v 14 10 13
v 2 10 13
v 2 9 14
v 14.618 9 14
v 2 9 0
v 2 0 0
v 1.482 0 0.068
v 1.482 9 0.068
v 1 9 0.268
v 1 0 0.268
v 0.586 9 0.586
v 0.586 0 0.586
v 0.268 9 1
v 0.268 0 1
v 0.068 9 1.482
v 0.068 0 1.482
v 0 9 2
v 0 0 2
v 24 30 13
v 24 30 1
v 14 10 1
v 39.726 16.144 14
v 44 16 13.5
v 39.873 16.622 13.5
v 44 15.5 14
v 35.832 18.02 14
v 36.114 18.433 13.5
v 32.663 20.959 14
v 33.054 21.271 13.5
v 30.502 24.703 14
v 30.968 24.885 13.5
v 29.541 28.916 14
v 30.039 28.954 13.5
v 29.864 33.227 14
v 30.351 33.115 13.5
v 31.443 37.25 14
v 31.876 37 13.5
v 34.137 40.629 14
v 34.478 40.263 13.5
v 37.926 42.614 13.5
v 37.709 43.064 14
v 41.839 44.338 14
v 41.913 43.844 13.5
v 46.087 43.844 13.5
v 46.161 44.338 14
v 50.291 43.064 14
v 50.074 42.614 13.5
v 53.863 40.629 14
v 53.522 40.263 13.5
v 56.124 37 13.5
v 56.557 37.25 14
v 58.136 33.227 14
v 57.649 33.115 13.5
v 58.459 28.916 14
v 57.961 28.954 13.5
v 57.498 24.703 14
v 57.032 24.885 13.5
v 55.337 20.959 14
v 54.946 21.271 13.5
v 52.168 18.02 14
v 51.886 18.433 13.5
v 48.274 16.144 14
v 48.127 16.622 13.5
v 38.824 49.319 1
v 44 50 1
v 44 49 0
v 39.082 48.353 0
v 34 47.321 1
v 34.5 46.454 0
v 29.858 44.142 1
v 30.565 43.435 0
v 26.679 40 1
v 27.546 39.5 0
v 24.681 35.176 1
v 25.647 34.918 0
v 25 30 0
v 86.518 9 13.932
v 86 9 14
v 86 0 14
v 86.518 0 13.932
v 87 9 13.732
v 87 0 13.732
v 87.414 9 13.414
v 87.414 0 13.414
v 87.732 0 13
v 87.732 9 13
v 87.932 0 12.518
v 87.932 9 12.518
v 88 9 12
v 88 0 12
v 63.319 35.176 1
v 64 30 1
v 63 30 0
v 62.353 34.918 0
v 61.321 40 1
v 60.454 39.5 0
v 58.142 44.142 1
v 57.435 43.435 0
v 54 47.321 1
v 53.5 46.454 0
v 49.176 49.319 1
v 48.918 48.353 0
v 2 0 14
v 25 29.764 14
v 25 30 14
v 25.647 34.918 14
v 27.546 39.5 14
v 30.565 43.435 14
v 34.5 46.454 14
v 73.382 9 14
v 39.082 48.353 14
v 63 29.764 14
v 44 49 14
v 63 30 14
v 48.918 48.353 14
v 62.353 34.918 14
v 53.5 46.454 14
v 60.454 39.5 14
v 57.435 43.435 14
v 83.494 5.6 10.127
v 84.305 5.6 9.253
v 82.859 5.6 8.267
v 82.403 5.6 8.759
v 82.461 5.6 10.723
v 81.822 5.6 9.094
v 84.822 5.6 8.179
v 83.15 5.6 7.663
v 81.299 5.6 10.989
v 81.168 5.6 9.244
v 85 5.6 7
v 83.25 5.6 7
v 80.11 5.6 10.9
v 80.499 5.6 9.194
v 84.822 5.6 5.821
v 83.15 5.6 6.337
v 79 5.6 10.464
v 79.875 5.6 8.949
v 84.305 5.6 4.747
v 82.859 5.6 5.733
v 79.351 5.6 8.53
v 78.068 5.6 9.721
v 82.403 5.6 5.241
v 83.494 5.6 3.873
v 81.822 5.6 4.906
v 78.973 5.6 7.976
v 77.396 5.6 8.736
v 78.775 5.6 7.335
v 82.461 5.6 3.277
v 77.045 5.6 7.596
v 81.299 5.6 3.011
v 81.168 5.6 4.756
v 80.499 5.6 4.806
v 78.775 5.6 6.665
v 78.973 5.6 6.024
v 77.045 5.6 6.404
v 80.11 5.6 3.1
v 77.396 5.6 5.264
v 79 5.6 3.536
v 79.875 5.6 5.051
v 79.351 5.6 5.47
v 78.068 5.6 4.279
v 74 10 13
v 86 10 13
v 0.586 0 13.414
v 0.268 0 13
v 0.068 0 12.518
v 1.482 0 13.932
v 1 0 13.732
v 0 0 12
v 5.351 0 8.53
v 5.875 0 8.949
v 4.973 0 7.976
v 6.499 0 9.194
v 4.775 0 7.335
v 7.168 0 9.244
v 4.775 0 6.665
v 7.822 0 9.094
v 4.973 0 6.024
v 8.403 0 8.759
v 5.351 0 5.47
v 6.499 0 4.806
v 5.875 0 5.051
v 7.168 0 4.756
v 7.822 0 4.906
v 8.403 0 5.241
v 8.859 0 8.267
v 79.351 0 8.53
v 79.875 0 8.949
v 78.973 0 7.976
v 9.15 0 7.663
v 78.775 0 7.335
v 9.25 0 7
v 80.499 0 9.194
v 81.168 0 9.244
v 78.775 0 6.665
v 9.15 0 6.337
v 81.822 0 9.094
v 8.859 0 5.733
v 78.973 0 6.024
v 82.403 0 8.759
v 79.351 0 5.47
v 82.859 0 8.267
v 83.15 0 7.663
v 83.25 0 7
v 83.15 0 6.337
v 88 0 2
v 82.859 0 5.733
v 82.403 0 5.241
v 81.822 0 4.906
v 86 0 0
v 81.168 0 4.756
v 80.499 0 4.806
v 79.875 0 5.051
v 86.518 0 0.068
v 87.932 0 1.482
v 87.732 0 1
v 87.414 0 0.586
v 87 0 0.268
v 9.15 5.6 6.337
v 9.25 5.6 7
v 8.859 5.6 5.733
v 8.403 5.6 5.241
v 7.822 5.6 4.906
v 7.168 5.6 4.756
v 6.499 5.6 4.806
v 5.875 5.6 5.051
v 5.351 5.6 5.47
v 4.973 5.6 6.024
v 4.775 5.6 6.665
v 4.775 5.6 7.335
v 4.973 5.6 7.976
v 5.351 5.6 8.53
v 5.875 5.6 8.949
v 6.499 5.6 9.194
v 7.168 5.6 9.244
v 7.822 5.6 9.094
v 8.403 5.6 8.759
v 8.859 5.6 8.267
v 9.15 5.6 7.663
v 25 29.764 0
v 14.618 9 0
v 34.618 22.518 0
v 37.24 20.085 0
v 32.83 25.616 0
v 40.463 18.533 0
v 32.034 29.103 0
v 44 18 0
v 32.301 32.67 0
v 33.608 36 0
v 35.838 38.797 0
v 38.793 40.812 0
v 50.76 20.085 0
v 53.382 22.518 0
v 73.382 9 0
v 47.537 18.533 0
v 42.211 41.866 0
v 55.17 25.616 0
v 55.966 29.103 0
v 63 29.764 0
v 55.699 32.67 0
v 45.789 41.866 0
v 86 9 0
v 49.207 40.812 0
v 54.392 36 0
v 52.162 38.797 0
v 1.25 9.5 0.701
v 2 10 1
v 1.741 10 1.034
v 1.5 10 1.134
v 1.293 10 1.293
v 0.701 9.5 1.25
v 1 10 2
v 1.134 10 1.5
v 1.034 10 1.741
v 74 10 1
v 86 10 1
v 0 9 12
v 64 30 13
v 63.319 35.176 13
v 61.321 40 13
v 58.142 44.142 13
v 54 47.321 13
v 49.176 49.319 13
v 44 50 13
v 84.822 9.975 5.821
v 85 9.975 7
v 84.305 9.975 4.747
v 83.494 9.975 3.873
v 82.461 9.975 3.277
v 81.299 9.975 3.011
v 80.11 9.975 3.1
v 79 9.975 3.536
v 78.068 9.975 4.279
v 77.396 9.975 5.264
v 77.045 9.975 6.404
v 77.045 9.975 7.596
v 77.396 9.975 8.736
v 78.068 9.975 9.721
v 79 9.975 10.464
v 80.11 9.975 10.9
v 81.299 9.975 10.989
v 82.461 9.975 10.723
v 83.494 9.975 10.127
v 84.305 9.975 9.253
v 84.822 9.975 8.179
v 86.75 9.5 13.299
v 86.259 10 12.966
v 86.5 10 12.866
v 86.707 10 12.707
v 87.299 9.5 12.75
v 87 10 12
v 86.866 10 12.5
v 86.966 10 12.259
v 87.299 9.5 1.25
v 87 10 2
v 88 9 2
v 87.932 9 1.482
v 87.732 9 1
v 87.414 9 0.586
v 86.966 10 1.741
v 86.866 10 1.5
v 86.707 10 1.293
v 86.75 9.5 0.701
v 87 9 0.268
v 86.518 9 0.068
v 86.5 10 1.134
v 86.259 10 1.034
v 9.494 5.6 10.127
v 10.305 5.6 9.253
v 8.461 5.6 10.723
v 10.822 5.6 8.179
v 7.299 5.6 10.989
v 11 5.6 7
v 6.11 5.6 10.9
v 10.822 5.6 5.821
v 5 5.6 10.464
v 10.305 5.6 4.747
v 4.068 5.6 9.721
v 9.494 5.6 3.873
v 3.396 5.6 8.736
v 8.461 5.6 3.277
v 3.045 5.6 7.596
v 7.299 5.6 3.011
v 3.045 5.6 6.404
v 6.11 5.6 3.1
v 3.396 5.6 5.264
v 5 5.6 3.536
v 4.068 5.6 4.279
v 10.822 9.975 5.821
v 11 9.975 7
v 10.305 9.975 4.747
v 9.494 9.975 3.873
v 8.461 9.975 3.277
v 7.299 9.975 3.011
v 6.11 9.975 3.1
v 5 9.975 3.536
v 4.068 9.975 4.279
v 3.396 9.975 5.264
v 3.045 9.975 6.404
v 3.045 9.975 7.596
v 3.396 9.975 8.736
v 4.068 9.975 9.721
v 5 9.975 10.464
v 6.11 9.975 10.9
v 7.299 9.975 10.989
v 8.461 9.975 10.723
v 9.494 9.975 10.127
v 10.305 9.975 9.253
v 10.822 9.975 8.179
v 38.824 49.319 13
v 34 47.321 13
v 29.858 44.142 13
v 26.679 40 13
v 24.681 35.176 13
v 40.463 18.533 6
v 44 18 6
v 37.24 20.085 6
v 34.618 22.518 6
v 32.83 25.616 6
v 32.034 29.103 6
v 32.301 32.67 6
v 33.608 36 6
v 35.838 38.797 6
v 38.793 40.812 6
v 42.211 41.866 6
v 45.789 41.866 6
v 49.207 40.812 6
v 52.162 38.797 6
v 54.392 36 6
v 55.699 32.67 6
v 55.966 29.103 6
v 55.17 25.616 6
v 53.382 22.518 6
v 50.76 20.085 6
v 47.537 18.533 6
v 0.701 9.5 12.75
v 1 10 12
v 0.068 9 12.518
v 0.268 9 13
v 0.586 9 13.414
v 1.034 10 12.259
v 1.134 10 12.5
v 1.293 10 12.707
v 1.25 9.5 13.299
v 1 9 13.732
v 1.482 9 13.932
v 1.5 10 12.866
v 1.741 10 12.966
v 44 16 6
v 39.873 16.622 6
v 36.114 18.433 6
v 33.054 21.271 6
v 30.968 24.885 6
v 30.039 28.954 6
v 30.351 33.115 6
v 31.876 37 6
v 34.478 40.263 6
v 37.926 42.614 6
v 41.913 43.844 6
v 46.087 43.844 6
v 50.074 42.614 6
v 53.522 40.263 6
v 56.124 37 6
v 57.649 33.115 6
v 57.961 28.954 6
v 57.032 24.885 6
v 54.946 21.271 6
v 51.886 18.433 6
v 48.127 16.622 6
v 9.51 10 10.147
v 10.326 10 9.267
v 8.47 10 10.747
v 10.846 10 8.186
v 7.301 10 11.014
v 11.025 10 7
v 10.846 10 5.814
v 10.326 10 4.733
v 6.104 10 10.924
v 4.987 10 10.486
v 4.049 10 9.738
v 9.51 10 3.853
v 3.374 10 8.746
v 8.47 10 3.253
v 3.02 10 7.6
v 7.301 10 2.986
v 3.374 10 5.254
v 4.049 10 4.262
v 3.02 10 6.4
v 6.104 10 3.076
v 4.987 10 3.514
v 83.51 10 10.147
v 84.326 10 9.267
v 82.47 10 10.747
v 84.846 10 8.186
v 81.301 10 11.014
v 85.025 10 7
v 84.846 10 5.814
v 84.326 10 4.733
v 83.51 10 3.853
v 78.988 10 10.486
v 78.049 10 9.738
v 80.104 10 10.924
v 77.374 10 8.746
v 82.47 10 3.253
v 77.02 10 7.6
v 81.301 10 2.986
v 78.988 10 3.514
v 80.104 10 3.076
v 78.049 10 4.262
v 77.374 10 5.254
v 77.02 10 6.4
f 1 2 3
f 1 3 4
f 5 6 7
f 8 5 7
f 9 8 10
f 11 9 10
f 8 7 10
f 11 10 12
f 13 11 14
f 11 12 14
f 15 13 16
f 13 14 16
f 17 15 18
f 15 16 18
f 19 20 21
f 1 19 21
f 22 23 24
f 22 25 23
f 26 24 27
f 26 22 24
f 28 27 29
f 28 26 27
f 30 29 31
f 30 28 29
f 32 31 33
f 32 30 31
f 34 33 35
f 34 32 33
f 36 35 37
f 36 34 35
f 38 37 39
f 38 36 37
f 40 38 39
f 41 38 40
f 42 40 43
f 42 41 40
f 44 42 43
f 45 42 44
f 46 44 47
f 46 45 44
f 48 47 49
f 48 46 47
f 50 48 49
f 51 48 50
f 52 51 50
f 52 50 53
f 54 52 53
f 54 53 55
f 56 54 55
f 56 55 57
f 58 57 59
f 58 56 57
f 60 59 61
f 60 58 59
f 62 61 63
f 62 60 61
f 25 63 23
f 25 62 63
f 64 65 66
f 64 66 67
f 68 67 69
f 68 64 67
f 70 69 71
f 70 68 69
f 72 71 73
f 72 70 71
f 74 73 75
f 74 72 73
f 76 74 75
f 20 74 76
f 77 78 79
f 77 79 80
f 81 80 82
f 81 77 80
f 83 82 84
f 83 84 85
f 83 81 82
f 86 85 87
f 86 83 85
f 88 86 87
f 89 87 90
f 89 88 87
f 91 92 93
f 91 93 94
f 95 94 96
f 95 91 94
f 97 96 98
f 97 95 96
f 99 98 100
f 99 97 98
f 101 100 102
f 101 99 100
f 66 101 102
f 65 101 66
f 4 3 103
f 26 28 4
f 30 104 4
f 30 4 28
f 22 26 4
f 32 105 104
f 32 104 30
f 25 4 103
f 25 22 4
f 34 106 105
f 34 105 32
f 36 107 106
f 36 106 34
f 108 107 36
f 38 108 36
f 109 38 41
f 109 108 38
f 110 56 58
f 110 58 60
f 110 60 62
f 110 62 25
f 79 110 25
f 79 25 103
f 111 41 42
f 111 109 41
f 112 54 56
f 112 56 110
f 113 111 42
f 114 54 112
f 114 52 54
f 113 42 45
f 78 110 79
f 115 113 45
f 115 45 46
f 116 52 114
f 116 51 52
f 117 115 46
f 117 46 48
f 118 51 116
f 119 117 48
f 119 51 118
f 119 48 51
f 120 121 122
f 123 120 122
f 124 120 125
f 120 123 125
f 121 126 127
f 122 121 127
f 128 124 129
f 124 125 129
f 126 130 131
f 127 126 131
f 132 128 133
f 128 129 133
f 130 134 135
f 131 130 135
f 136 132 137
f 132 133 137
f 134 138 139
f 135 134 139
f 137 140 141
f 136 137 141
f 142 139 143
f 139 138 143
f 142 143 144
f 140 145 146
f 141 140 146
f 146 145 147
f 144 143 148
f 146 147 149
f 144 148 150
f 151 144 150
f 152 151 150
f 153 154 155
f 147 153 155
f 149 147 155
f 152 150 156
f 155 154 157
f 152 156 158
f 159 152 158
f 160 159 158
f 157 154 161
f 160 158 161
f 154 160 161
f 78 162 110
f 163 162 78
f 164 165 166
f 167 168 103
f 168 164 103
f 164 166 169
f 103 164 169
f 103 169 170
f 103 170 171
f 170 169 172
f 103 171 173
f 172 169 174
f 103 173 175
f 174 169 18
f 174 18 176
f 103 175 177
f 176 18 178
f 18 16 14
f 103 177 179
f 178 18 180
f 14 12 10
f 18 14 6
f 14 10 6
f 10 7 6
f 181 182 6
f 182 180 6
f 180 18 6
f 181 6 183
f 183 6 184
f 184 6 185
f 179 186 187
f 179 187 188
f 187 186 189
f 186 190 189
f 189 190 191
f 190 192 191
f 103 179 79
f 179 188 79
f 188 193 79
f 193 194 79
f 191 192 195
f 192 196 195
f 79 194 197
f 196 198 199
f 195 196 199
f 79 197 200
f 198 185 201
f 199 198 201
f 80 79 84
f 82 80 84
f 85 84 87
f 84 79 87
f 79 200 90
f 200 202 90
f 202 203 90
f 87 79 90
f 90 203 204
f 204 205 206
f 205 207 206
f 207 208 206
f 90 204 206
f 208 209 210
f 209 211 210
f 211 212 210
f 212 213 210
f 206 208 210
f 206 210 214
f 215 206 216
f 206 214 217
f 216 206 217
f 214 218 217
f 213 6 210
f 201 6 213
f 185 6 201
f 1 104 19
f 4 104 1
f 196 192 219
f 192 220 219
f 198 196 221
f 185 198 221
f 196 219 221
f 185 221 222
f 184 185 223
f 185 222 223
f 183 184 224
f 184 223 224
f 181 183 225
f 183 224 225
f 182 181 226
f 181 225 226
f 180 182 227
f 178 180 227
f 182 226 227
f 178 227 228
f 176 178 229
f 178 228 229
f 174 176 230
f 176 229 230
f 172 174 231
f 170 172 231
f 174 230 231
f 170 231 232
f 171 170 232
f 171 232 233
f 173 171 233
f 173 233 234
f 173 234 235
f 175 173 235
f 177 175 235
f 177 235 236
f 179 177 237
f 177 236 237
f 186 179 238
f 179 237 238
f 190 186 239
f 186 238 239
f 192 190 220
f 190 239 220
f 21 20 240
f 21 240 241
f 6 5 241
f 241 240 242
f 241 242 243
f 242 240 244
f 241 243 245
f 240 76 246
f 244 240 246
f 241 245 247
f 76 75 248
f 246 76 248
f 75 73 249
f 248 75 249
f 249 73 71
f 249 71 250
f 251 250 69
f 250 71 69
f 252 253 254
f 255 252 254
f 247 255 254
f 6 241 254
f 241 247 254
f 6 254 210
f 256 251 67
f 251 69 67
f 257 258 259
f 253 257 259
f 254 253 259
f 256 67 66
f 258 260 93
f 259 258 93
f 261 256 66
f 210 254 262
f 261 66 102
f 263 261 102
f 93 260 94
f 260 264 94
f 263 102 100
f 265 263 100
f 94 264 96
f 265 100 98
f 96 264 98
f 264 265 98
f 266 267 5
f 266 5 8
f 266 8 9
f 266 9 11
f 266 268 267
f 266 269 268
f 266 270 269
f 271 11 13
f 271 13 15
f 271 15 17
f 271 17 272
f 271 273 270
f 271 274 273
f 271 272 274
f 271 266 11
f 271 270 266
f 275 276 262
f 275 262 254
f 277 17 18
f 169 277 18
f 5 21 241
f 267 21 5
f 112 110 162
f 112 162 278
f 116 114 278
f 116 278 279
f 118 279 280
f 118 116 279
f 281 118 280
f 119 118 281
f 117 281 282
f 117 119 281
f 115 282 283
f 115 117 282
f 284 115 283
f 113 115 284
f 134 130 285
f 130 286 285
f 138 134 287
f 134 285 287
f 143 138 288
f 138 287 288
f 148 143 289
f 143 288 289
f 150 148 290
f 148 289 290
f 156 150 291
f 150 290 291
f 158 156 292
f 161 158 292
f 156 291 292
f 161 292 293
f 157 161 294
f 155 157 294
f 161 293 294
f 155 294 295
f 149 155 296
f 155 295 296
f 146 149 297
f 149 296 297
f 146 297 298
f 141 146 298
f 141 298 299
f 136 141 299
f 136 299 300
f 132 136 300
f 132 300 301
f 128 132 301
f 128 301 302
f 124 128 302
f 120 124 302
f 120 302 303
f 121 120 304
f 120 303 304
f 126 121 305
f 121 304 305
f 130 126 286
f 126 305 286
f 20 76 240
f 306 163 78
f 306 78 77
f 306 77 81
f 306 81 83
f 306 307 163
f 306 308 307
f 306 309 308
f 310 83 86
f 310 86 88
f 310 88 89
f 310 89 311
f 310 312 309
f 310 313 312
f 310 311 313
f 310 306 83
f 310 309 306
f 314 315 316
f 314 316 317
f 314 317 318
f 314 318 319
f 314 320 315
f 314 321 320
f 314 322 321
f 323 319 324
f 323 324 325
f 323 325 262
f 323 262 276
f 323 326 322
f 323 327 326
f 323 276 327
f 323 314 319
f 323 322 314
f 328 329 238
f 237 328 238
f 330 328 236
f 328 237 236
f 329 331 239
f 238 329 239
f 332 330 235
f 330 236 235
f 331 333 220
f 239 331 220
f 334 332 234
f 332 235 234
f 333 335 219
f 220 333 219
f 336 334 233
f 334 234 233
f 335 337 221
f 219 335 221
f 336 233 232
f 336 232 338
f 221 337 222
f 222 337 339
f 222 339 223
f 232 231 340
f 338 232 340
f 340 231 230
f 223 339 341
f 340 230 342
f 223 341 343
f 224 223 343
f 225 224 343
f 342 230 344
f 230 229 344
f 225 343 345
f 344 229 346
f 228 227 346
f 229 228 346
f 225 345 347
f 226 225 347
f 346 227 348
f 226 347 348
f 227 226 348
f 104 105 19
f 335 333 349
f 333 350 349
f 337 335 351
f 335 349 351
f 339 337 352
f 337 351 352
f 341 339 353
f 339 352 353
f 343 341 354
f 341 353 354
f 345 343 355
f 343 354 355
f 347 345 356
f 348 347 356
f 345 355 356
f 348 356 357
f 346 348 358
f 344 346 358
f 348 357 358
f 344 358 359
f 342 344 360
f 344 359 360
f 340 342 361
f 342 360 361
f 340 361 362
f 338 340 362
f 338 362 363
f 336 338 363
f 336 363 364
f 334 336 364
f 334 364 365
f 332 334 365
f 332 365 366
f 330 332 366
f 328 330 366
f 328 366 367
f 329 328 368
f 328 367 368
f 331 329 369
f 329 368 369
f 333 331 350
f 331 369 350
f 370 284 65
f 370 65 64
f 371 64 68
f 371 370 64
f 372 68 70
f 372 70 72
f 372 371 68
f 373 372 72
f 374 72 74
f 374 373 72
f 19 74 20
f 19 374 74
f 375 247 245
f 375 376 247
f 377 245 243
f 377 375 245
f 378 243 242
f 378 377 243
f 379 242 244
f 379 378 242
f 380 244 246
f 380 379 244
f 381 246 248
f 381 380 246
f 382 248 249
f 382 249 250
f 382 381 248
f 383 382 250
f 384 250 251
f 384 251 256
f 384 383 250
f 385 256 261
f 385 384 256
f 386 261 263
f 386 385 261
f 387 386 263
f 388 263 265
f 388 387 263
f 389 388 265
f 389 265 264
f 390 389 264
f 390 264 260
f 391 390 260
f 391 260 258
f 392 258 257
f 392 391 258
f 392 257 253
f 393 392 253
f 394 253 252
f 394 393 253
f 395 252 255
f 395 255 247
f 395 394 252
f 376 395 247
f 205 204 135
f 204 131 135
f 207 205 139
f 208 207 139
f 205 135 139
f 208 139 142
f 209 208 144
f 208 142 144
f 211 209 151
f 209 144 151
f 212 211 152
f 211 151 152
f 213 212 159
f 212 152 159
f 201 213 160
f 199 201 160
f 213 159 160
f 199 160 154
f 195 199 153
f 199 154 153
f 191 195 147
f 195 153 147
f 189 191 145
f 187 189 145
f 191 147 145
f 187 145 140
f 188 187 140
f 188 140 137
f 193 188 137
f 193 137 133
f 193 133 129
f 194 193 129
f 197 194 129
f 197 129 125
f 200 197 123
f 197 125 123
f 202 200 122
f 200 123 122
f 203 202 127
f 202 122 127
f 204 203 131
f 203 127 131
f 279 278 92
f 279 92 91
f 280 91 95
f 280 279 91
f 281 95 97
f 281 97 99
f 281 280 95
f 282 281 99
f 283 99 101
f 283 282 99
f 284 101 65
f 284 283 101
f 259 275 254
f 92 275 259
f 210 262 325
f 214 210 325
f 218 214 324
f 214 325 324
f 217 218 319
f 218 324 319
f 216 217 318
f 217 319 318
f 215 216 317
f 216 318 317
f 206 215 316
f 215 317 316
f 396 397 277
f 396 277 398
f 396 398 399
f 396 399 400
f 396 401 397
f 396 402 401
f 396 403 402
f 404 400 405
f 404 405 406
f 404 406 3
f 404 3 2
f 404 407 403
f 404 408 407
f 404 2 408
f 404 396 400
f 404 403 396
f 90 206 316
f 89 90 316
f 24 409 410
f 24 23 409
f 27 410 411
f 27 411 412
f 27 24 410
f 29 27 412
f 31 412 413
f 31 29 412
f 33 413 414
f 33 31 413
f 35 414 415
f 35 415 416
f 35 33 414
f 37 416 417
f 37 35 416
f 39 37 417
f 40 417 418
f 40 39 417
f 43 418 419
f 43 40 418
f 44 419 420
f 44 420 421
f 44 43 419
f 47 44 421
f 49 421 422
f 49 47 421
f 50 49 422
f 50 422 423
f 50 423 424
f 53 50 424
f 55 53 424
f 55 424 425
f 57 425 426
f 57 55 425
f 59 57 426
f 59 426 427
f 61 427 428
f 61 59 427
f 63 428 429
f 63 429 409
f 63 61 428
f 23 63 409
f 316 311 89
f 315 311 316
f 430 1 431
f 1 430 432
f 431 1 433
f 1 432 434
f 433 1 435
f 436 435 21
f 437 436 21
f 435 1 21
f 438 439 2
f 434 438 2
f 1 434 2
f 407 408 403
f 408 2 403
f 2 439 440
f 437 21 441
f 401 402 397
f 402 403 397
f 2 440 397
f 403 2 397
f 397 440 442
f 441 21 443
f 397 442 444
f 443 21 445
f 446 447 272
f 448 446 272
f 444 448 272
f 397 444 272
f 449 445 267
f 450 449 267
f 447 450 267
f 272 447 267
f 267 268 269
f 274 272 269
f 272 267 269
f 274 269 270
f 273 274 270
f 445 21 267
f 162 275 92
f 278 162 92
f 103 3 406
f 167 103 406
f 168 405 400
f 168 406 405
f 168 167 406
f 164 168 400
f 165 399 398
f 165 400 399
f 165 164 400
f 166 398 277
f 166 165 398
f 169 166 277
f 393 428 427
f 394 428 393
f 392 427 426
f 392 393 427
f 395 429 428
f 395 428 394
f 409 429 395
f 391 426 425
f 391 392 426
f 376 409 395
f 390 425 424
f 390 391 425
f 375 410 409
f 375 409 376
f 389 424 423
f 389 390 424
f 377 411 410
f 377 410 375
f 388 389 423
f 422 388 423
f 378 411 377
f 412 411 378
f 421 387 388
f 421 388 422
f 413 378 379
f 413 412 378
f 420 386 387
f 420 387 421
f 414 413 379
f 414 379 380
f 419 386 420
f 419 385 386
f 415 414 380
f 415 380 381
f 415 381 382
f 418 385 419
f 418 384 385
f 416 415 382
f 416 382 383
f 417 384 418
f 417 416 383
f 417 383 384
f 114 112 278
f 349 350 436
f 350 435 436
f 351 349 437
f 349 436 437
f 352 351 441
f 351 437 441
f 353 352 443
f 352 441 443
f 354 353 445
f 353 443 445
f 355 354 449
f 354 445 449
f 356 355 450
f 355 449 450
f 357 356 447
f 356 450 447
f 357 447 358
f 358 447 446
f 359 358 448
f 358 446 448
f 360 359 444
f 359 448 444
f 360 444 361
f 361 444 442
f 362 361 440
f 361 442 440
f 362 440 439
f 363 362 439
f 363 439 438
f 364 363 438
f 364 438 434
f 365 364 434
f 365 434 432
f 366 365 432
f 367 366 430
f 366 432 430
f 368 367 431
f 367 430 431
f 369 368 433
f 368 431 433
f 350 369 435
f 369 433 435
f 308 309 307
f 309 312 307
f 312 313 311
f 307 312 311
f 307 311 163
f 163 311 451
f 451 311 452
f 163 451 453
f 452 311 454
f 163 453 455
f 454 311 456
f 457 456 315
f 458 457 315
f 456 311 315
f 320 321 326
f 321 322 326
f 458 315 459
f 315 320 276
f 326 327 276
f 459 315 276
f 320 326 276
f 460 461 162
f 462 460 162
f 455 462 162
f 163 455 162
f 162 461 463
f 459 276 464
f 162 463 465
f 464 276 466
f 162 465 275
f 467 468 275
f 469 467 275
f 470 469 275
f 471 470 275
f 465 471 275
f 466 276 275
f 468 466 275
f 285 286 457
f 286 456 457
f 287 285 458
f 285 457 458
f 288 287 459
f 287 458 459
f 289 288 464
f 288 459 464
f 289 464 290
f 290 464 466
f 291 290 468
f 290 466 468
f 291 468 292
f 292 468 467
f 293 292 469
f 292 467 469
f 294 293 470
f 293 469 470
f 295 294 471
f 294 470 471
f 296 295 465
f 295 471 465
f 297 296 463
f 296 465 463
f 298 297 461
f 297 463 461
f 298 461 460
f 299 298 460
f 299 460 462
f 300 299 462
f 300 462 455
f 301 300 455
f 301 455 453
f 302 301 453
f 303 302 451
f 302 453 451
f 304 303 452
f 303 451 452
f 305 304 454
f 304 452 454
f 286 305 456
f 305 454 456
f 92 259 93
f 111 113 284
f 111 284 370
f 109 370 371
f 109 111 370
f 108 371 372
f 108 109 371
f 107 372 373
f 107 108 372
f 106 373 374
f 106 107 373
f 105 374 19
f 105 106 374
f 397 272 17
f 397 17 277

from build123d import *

# Parameters (mm, degrees)
BODY_DEPTH           = 14
TOP_FILLET_R         = 20
SIDE_FILLETS_R       = 2
DESIGN_CHAMFERS_SIZE = 1


# Read off the part's stored shape, not the designer's step: mounting_holes
with BuildPart() as part:
    # Sketch1 → body (new body)
    with BuildSketch(Plane.XY):
        Polygon((0, 0), (88, 0), (88, 10), (74, 10), (64, 30), (64, 50), (24, 50), (24, 30), (14, 10), (0, 10), align=None)
    extrude(amount=BODY_DEPTH)

    # top_fillet
    top_fillet_edges = [part.edges().sort_by_distance(p)[0] for p in [
        (24, 50, 7),
        (64, 50, 7),
    ]]
    fillet(top_fillet_edges, radius=TOP_FILLET_R - 0.0001)  # a hair under: the kernel refuses the full size

    # Sketch4 → bearing_hole (revolve, cut)
    with BuildSketch(Plane(origin=(44, 30, 14), x_dir=(0, -1, 0), z_dir=(1, 0, 0))):
        Polygon((0, 0), (0, 14), (12, 14), (12, 8), (14, 8), (14, 0.5), (14.5, 0), align=None)
    revolve(axis=Axis((44, 30, 20.35), (0, 0, -1)), mode=Mode.SUBTRACT)

    # mounting_holes outline → mounting_holes (revolve, cut)
    with BuildSketch(Plane(origin=(81, 0, 7), x_dir=(1, 0, 0), z_dir=(0, 0, 1))):
        Polygon((0, 0), (2.25, 0), (2.25, 5.6), (4, 5.6), (4, 9.975), (4.025, 10), (0, 10), align=None)
    revolve(axis=Axis((81, 0, 7), (0, 1, 0)), mode=Mode.SUBTRACT)

    # mounting_holes 2 outline → mounting_holes 2 (revolve, cut)
    with BuildSketch(Plane(origin=(7, 0, 7), x_dir=(1, 0, 0), z_dir=(0, 0, 1))):
        Polygon((0, 10), (0, 0), (2.25, 0), (2.25, 5.6), (4, 5.6), (4, 9.975), (4.025, 10), align=None)
    revolve(axis=Axis((7, 0, 7), (0, 1, 0)), mode=Mode.SUBTRACT)

    # side_fillets
    side_fillets_edges = [part.edges().sort_by_distance(p)[0] for p in [
        (88, 5, 14),
        (88, 5, 0),
        (0, 5, 0),
        (0, 5, 14),
    ]]
    fillet(side_fillets_edges, radius=SIDE_FILLETS_R)

    # design_chamfers
    design_chamfers_edges = [part.edges().sort_by_distance(p)[0] for p in [
        (8, 10, 0),
        (19, 20, 0),
        (69, 20, 0),
        (69, 20, 14),
        (58.142164913, 44.142164913, 0),
        (29.857835087, 44.142164913, 0),
        (58.142164913, 44.142164913, 14),
        (29.857835087, 44.142164913, 14),
        (19, 20, 14),
        (8, 10, 14),
        (0, 10, 7),
        (80, 10, 0),
        (0.585786438, 10, 13.414213562),
        (0.585786438, 10, 0.585786438),
        (88, 10, 7),
        (80, 10, 14),
        (87.414213562, 10, 13.414213562),
        (87.414213562, 10, 0.585786438),
    ]]
    chamfer(design_chamfers_edges, length=DESIGN_CHAMFERS_SIZE)


solid = part.part
